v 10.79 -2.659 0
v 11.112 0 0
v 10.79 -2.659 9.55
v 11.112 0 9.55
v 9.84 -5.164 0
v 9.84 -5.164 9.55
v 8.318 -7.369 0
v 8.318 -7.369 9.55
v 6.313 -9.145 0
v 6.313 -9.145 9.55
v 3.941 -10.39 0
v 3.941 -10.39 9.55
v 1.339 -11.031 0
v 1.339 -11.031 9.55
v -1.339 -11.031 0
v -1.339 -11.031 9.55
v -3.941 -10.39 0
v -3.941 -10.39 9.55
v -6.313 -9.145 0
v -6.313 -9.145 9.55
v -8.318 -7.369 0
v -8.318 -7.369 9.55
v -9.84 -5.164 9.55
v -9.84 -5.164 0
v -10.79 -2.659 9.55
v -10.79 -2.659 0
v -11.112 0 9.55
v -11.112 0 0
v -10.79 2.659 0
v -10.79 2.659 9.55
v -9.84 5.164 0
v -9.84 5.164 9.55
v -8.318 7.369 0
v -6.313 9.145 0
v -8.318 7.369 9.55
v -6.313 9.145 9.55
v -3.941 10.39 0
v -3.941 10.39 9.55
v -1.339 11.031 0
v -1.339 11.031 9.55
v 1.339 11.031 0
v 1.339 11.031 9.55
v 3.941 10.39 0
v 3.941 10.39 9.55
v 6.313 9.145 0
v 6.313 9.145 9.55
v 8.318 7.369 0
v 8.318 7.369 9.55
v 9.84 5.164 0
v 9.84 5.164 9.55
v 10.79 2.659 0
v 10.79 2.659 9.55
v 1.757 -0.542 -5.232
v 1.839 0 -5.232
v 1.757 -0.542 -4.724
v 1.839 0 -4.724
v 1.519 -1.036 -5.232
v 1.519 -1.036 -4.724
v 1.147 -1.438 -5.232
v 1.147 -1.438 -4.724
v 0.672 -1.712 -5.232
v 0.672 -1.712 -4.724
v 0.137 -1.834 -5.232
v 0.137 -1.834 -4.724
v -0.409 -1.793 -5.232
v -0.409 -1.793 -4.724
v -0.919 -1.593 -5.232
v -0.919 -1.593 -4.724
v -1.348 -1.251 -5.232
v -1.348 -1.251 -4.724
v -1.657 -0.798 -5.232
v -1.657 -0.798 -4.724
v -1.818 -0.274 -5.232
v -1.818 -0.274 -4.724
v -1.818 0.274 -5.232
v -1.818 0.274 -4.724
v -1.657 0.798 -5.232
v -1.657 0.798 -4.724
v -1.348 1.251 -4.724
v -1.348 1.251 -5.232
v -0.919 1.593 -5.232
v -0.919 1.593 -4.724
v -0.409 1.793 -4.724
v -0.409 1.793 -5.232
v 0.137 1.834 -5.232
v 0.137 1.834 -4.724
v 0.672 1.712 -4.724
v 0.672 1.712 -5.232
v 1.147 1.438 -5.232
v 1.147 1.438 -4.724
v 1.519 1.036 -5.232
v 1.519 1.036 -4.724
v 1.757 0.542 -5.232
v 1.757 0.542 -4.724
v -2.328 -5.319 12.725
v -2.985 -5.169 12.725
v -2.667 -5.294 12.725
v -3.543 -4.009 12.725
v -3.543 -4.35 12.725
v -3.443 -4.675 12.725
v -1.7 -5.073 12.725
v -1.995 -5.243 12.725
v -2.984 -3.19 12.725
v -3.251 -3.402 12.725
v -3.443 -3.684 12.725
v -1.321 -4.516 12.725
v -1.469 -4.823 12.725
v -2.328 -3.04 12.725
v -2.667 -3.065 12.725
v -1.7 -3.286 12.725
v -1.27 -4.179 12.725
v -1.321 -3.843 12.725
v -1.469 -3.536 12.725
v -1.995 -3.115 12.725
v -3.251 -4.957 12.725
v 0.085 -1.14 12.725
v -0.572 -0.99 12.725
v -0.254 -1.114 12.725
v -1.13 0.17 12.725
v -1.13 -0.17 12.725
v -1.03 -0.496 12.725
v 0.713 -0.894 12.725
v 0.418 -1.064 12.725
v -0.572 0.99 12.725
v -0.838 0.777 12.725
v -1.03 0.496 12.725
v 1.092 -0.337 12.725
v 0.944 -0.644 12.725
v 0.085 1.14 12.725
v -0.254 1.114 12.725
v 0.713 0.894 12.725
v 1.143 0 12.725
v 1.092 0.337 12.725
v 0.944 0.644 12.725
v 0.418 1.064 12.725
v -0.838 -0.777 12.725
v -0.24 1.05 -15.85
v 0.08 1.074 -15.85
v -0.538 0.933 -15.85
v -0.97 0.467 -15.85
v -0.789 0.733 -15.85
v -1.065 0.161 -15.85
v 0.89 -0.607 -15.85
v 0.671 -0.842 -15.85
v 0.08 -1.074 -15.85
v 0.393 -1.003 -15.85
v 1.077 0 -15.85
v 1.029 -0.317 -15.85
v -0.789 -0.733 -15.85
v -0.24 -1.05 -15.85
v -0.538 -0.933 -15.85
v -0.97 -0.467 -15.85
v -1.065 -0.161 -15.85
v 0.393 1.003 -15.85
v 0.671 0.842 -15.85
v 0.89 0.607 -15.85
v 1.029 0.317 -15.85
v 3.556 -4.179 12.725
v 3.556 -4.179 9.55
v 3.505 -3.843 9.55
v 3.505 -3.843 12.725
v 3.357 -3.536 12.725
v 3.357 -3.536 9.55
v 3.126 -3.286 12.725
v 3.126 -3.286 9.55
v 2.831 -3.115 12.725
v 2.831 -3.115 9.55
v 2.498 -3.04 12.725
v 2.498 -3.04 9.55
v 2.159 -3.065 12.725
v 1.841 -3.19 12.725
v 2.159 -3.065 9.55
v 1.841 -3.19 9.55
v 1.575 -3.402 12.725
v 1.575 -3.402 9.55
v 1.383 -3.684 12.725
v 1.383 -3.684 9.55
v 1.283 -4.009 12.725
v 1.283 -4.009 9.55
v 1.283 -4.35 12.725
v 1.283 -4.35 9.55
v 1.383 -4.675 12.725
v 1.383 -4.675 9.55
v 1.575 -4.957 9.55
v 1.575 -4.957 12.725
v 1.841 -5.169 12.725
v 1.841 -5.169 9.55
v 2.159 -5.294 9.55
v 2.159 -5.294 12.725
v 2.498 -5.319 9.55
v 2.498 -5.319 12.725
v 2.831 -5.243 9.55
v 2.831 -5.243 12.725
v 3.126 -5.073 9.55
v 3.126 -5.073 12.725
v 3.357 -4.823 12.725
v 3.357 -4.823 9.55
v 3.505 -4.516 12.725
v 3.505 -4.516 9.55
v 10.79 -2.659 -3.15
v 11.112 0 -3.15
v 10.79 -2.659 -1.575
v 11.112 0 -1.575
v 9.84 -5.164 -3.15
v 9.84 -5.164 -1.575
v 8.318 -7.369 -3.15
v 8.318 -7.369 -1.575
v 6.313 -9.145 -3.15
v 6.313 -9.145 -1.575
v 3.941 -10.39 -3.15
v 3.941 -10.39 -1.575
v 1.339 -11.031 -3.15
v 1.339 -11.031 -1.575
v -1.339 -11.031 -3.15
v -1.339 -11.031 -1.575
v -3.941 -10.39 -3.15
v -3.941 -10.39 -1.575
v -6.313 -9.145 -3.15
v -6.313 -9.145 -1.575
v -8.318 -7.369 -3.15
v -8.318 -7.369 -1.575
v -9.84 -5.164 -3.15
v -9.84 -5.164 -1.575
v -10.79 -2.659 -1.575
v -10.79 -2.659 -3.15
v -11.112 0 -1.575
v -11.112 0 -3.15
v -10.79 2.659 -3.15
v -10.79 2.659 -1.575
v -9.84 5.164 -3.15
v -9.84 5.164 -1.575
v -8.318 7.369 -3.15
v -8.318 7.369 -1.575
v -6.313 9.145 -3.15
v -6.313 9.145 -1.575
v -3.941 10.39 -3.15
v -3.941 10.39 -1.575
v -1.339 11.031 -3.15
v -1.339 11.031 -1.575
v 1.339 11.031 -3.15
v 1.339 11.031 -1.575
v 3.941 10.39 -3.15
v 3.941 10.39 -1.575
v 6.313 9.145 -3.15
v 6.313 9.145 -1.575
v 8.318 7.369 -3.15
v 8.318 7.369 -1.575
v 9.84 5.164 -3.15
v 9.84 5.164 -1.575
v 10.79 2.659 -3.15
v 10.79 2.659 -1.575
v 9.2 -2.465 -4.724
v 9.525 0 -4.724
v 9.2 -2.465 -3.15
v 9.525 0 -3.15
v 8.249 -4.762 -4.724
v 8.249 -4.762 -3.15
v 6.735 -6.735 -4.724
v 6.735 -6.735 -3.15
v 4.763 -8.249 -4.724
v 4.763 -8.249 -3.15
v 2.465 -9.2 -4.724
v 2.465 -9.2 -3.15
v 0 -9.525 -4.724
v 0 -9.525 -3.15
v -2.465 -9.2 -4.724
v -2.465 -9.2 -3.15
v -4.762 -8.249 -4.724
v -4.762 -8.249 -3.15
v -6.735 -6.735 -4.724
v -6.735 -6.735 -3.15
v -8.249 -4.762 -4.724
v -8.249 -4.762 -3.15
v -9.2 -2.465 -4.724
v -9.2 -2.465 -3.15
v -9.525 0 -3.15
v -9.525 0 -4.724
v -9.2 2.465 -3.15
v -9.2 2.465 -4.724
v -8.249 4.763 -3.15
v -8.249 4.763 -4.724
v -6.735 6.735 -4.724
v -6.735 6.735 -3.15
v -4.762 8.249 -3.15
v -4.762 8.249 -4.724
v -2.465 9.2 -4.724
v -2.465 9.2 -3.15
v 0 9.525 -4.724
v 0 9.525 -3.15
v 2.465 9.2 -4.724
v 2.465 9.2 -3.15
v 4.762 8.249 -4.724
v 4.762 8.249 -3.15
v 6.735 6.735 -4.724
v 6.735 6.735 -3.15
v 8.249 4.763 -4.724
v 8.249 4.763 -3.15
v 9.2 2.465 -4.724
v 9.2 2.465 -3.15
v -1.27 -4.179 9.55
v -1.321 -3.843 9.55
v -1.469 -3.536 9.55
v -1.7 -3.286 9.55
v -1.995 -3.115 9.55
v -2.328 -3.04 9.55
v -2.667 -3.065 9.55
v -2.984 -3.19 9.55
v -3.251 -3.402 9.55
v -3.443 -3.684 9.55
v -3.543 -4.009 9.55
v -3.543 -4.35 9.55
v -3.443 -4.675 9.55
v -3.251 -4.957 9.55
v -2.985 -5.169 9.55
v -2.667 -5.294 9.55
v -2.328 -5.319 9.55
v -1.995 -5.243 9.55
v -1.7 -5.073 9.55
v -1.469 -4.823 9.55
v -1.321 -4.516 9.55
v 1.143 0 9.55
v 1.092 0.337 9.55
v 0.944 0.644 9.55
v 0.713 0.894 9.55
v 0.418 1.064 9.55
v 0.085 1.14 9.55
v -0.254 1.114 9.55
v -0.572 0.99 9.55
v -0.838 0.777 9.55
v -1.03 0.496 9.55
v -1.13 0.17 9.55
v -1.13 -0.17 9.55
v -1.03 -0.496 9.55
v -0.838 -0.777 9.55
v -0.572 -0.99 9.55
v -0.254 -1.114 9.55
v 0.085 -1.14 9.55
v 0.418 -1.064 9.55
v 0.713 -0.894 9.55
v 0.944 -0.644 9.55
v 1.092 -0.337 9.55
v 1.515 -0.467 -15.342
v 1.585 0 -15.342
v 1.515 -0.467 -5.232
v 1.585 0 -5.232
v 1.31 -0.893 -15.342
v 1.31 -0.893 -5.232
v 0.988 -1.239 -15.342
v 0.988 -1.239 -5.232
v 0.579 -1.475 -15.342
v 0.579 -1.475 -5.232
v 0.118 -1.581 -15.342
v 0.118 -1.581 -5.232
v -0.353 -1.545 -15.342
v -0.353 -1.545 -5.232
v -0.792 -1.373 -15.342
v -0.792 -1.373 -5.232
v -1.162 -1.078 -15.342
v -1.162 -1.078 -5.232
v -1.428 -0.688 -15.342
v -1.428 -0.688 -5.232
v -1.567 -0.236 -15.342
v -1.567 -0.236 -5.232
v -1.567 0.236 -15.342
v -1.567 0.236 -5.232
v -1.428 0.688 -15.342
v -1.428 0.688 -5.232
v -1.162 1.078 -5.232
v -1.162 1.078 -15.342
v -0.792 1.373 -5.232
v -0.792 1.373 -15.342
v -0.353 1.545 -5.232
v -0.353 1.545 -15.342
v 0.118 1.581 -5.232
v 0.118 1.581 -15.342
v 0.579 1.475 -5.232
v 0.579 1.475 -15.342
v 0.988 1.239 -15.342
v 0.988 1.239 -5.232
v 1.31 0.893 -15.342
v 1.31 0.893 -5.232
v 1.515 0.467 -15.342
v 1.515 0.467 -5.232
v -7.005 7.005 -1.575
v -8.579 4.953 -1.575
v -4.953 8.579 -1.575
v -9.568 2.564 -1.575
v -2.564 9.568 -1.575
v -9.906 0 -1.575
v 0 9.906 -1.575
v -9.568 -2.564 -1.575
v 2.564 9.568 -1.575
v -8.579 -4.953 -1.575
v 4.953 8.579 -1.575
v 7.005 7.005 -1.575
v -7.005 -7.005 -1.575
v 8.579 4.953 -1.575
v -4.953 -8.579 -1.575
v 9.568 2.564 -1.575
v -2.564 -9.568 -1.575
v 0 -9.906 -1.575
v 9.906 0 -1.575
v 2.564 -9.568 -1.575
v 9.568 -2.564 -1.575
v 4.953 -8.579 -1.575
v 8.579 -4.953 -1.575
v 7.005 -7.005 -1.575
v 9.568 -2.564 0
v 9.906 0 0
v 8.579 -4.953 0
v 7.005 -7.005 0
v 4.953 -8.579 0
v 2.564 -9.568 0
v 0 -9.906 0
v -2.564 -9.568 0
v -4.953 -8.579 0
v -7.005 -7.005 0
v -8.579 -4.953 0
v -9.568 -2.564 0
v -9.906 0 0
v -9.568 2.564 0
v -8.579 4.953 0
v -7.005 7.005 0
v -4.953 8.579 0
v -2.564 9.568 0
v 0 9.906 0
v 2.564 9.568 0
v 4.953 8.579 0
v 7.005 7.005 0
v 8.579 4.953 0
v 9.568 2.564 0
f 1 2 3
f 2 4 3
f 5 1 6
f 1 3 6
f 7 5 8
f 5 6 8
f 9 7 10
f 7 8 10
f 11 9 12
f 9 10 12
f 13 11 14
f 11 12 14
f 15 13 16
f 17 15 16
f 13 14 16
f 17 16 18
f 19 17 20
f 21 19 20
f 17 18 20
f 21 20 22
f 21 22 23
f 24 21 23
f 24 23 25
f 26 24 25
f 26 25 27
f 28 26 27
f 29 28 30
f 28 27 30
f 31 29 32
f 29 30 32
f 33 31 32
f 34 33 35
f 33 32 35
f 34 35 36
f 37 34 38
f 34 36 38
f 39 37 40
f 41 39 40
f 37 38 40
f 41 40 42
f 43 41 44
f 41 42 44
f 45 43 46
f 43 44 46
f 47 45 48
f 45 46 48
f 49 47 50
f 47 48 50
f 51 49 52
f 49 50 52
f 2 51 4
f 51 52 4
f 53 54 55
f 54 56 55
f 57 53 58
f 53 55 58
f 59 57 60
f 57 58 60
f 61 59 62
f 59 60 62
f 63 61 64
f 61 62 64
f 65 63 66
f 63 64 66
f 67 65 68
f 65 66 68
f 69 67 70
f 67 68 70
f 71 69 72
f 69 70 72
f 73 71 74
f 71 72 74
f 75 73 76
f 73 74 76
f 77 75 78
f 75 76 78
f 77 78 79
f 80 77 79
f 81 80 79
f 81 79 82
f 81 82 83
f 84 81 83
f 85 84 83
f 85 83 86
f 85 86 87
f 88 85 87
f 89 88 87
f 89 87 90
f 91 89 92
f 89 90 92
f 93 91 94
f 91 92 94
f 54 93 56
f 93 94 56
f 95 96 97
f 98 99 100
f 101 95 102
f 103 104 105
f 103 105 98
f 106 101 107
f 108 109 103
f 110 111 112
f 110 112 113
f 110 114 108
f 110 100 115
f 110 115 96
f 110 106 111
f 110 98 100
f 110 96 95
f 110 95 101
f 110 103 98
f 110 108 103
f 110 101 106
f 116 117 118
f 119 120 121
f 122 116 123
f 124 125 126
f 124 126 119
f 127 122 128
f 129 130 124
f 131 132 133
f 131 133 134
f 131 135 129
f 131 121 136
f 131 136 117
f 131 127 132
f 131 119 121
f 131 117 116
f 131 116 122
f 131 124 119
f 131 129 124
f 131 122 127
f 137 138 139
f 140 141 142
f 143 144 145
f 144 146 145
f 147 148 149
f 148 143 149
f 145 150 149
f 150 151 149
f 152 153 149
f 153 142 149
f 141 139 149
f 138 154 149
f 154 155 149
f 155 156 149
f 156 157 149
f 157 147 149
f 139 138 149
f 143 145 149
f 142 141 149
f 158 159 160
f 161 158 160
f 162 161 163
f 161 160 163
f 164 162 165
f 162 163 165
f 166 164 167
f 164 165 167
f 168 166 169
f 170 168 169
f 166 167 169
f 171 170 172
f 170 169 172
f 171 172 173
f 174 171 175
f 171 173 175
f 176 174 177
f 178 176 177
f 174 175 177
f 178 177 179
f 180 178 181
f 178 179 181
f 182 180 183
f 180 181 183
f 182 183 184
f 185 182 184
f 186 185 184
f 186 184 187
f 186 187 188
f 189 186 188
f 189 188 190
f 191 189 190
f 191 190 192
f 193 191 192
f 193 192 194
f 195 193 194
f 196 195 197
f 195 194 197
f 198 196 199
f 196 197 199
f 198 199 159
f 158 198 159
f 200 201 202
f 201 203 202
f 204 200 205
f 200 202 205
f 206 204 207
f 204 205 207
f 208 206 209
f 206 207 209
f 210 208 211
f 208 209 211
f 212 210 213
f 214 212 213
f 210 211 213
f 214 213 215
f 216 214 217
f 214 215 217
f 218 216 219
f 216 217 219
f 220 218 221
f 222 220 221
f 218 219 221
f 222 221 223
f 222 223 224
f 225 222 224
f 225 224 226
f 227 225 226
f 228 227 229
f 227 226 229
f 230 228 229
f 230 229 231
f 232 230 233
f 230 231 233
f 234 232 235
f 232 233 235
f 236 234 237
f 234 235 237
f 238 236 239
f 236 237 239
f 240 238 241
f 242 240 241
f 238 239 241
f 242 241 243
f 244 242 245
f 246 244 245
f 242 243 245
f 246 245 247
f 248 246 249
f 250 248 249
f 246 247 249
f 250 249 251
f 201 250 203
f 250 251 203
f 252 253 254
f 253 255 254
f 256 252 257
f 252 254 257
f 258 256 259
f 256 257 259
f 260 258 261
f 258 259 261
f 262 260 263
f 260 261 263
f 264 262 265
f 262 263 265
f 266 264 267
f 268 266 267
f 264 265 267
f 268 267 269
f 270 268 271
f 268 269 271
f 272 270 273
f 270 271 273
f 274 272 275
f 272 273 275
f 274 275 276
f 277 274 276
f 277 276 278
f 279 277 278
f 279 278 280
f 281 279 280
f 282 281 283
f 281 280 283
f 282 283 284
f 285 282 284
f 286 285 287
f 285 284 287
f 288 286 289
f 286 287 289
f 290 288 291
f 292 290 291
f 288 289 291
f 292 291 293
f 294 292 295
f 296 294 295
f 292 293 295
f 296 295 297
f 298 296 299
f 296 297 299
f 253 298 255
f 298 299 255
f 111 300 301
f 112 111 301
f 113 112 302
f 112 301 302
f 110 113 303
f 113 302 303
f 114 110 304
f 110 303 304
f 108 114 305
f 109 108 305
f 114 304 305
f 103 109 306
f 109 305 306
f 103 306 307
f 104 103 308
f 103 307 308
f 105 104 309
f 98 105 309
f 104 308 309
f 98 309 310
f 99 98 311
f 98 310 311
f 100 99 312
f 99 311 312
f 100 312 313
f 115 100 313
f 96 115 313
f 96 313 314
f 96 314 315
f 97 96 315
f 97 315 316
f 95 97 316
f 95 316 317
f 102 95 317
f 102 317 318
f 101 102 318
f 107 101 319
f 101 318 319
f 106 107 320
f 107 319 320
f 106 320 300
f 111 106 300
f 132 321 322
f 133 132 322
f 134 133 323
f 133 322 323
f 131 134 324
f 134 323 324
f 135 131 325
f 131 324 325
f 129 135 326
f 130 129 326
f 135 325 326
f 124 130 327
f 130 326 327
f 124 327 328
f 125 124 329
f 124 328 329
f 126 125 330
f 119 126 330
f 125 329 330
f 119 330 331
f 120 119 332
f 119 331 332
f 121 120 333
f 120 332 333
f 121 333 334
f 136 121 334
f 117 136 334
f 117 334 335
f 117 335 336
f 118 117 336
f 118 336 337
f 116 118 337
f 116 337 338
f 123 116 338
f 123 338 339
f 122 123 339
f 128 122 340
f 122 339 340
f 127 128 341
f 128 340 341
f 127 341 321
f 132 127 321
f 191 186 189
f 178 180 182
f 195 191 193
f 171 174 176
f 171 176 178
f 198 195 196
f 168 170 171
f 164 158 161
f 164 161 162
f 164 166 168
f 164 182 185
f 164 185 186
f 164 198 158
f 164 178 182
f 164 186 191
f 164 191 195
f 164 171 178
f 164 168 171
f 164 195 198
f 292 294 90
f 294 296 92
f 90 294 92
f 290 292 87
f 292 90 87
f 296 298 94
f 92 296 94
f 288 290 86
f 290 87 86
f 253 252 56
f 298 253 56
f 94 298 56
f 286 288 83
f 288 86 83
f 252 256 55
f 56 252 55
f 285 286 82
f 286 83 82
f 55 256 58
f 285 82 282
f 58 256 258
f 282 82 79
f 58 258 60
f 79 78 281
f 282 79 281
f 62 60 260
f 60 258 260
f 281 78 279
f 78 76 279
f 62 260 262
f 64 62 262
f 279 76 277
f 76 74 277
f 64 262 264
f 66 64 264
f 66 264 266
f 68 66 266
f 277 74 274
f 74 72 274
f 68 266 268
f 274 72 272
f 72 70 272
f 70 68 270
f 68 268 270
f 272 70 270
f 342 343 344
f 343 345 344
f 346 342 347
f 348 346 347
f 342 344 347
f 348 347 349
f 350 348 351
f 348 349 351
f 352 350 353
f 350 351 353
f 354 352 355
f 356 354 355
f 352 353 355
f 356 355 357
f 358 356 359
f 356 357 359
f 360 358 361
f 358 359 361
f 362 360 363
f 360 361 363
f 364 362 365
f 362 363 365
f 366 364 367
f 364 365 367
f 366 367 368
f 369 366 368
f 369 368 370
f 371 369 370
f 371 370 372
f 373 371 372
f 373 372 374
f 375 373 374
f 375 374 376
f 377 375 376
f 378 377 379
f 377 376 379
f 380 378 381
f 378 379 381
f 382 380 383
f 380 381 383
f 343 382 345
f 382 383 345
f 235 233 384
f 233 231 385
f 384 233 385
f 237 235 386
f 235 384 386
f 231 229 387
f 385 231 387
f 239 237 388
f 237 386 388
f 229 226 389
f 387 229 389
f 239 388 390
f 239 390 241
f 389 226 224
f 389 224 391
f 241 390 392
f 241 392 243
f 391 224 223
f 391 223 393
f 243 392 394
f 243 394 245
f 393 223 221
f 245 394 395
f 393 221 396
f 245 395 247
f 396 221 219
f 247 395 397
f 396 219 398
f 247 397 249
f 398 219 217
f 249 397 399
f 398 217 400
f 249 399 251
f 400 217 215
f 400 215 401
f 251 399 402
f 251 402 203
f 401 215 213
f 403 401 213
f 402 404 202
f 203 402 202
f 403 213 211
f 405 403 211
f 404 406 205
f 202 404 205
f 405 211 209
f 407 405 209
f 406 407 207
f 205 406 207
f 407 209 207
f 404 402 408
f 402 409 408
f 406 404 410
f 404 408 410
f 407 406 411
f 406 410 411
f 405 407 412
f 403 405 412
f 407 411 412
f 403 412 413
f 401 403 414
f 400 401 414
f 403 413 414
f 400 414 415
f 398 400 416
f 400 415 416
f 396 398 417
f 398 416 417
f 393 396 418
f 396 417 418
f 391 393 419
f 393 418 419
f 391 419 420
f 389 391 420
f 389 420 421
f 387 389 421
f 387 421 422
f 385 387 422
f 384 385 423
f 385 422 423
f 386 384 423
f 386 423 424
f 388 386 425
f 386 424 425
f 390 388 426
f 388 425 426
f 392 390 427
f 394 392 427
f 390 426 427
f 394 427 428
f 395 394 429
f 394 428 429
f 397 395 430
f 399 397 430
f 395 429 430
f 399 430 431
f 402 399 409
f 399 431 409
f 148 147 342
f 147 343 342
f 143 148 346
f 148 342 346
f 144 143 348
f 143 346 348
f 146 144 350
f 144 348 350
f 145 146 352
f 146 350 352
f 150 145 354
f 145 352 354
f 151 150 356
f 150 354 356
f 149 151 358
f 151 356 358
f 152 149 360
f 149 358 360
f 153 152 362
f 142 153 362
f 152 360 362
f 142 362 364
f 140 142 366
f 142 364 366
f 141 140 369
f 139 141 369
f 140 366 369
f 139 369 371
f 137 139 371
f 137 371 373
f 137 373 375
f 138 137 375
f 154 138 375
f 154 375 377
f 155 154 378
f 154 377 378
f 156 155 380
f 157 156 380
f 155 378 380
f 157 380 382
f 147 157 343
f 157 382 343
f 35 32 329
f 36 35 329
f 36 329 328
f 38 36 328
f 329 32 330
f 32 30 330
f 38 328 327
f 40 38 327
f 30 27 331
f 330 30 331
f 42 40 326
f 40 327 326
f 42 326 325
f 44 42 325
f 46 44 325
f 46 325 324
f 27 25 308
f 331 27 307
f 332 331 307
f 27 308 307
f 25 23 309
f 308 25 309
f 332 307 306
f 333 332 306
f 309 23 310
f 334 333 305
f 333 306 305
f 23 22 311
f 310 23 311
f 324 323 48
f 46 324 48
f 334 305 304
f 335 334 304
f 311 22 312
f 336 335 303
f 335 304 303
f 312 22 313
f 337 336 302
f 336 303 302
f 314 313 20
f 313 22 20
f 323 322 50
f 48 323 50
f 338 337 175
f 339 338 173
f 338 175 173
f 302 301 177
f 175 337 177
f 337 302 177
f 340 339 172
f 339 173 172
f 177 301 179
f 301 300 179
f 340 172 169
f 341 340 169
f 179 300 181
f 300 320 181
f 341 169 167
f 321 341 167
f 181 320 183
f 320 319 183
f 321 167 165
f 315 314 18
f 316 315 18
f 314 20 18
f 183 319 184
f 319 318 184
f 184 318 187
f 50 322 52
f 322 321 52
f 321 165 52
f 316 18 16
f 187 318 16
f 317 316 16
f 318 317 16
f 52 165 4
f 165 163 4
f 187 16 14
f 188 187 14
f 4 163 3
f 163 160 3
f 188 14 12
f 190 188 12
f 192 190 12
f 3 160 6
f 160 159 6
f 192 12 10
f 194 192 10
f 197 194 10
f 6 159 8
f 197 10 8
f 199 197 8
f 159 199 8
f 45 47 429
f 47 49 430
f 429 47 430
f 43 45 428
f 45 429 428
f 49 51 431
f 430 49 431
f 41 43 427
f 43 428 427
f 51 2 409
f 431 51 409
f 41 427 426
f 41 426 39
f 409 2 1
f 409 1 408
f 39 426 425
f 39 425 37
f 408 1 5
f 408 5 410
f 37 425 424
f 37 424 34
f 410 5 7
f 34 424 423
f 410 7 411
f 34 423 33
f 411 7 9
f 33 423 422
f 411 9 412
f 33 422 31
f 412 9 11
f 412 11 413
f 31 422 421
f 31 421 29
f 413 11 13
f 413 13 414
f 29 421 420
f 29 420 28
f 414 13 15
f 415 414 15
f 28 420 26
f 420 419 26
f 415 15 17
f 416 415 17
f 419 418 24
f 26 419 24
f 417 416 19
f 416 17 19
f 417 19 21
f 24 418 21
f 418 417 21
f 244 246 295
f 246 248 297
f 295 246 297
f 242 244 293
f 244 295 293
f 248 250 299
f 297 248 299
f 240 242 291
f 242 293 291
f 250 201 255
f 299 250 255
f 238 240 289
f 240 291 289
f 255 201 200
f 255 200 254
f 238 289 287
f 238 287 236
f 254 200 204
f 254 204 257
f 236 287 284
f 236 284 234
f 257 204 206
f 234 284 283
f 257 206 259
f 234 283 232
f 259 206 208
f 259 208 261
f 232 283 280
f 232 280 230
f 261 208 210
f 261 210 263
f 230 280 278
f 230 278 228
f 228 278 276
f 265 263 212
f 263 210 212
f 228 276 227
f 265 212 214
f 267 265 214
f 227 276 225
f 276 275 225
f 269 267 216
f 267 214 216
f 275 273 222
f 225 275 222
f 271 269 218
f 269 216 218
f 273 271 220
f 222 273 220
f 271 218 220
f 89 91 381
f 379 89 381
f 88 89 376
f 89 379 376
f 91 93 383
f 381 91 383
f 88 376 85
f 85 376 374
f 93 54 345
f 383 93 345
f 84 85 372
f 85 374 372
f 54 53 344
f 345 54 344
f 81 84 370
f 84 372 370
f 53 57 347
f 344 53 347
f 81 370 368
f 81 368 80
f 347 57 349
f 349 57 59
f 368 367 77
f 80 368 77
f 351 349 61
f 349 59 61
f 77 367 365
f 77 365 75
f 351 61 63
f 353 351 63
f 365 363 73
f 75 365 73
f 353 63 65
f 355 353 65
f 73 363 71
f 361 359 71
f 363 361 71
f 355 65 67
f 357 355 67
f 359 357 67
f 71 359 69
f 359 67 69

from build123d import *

# Parameters (mm, degrees)
SKETCH3_R           = 1.143
BOSS_EXTRUDE1_DEPTH = 3.175


with BuildPart() as part:
    # Sketch2 → Revolve2 (revolve)
    with BuildSketch(Plane(origin=(0, 0, 0), x_dir=(0, 0, -1), z_dir=(1, 0, 0)), mode=Mode.PRIVATE) as revolve2_sk:
        Polygon((-9.5504, 11.1125), (-9.5504, 0), (4.7244, 0), (4.7244, 1.83896), (4.7244, 9.525), (3.1496, 9.525), (3.1496, 11.1125), (1.5748, 11.1125), (1.5748, 9.906), (0, 9.906), (0, 11.1125), align=None)
        Polygon((4.7244, 1.83896), (4.7244, 0), (15.8496, 0), (15.8496, 1.07696), (15.3416, 1.58496), (5.2324, 1.58496), (5.2324, 1.83896), align=None)
    revolve(revolve2_sk.sketch.rotate(Axis((0, 0, 28.040799935), (0, 0, -1)), 90), axis=Axis((0, 0, 28.040799935), (0, 0, -1)))

    # Sketch3 → Boss-Extrude1 (add)
    with BuildSketch(Plane.XY.offset(9.5504)):
        Circle(SKETCH3_R)
        with Locations((-2.413, -4.179438599)):
            Circle(SKETCH3_R)
        with Locations((2.413, -4.179438599)):
            Circle(SKETCH3_R)
    extrude(amount=BOSS_EXTRUDE1_DEPTH)


solid = part.part
